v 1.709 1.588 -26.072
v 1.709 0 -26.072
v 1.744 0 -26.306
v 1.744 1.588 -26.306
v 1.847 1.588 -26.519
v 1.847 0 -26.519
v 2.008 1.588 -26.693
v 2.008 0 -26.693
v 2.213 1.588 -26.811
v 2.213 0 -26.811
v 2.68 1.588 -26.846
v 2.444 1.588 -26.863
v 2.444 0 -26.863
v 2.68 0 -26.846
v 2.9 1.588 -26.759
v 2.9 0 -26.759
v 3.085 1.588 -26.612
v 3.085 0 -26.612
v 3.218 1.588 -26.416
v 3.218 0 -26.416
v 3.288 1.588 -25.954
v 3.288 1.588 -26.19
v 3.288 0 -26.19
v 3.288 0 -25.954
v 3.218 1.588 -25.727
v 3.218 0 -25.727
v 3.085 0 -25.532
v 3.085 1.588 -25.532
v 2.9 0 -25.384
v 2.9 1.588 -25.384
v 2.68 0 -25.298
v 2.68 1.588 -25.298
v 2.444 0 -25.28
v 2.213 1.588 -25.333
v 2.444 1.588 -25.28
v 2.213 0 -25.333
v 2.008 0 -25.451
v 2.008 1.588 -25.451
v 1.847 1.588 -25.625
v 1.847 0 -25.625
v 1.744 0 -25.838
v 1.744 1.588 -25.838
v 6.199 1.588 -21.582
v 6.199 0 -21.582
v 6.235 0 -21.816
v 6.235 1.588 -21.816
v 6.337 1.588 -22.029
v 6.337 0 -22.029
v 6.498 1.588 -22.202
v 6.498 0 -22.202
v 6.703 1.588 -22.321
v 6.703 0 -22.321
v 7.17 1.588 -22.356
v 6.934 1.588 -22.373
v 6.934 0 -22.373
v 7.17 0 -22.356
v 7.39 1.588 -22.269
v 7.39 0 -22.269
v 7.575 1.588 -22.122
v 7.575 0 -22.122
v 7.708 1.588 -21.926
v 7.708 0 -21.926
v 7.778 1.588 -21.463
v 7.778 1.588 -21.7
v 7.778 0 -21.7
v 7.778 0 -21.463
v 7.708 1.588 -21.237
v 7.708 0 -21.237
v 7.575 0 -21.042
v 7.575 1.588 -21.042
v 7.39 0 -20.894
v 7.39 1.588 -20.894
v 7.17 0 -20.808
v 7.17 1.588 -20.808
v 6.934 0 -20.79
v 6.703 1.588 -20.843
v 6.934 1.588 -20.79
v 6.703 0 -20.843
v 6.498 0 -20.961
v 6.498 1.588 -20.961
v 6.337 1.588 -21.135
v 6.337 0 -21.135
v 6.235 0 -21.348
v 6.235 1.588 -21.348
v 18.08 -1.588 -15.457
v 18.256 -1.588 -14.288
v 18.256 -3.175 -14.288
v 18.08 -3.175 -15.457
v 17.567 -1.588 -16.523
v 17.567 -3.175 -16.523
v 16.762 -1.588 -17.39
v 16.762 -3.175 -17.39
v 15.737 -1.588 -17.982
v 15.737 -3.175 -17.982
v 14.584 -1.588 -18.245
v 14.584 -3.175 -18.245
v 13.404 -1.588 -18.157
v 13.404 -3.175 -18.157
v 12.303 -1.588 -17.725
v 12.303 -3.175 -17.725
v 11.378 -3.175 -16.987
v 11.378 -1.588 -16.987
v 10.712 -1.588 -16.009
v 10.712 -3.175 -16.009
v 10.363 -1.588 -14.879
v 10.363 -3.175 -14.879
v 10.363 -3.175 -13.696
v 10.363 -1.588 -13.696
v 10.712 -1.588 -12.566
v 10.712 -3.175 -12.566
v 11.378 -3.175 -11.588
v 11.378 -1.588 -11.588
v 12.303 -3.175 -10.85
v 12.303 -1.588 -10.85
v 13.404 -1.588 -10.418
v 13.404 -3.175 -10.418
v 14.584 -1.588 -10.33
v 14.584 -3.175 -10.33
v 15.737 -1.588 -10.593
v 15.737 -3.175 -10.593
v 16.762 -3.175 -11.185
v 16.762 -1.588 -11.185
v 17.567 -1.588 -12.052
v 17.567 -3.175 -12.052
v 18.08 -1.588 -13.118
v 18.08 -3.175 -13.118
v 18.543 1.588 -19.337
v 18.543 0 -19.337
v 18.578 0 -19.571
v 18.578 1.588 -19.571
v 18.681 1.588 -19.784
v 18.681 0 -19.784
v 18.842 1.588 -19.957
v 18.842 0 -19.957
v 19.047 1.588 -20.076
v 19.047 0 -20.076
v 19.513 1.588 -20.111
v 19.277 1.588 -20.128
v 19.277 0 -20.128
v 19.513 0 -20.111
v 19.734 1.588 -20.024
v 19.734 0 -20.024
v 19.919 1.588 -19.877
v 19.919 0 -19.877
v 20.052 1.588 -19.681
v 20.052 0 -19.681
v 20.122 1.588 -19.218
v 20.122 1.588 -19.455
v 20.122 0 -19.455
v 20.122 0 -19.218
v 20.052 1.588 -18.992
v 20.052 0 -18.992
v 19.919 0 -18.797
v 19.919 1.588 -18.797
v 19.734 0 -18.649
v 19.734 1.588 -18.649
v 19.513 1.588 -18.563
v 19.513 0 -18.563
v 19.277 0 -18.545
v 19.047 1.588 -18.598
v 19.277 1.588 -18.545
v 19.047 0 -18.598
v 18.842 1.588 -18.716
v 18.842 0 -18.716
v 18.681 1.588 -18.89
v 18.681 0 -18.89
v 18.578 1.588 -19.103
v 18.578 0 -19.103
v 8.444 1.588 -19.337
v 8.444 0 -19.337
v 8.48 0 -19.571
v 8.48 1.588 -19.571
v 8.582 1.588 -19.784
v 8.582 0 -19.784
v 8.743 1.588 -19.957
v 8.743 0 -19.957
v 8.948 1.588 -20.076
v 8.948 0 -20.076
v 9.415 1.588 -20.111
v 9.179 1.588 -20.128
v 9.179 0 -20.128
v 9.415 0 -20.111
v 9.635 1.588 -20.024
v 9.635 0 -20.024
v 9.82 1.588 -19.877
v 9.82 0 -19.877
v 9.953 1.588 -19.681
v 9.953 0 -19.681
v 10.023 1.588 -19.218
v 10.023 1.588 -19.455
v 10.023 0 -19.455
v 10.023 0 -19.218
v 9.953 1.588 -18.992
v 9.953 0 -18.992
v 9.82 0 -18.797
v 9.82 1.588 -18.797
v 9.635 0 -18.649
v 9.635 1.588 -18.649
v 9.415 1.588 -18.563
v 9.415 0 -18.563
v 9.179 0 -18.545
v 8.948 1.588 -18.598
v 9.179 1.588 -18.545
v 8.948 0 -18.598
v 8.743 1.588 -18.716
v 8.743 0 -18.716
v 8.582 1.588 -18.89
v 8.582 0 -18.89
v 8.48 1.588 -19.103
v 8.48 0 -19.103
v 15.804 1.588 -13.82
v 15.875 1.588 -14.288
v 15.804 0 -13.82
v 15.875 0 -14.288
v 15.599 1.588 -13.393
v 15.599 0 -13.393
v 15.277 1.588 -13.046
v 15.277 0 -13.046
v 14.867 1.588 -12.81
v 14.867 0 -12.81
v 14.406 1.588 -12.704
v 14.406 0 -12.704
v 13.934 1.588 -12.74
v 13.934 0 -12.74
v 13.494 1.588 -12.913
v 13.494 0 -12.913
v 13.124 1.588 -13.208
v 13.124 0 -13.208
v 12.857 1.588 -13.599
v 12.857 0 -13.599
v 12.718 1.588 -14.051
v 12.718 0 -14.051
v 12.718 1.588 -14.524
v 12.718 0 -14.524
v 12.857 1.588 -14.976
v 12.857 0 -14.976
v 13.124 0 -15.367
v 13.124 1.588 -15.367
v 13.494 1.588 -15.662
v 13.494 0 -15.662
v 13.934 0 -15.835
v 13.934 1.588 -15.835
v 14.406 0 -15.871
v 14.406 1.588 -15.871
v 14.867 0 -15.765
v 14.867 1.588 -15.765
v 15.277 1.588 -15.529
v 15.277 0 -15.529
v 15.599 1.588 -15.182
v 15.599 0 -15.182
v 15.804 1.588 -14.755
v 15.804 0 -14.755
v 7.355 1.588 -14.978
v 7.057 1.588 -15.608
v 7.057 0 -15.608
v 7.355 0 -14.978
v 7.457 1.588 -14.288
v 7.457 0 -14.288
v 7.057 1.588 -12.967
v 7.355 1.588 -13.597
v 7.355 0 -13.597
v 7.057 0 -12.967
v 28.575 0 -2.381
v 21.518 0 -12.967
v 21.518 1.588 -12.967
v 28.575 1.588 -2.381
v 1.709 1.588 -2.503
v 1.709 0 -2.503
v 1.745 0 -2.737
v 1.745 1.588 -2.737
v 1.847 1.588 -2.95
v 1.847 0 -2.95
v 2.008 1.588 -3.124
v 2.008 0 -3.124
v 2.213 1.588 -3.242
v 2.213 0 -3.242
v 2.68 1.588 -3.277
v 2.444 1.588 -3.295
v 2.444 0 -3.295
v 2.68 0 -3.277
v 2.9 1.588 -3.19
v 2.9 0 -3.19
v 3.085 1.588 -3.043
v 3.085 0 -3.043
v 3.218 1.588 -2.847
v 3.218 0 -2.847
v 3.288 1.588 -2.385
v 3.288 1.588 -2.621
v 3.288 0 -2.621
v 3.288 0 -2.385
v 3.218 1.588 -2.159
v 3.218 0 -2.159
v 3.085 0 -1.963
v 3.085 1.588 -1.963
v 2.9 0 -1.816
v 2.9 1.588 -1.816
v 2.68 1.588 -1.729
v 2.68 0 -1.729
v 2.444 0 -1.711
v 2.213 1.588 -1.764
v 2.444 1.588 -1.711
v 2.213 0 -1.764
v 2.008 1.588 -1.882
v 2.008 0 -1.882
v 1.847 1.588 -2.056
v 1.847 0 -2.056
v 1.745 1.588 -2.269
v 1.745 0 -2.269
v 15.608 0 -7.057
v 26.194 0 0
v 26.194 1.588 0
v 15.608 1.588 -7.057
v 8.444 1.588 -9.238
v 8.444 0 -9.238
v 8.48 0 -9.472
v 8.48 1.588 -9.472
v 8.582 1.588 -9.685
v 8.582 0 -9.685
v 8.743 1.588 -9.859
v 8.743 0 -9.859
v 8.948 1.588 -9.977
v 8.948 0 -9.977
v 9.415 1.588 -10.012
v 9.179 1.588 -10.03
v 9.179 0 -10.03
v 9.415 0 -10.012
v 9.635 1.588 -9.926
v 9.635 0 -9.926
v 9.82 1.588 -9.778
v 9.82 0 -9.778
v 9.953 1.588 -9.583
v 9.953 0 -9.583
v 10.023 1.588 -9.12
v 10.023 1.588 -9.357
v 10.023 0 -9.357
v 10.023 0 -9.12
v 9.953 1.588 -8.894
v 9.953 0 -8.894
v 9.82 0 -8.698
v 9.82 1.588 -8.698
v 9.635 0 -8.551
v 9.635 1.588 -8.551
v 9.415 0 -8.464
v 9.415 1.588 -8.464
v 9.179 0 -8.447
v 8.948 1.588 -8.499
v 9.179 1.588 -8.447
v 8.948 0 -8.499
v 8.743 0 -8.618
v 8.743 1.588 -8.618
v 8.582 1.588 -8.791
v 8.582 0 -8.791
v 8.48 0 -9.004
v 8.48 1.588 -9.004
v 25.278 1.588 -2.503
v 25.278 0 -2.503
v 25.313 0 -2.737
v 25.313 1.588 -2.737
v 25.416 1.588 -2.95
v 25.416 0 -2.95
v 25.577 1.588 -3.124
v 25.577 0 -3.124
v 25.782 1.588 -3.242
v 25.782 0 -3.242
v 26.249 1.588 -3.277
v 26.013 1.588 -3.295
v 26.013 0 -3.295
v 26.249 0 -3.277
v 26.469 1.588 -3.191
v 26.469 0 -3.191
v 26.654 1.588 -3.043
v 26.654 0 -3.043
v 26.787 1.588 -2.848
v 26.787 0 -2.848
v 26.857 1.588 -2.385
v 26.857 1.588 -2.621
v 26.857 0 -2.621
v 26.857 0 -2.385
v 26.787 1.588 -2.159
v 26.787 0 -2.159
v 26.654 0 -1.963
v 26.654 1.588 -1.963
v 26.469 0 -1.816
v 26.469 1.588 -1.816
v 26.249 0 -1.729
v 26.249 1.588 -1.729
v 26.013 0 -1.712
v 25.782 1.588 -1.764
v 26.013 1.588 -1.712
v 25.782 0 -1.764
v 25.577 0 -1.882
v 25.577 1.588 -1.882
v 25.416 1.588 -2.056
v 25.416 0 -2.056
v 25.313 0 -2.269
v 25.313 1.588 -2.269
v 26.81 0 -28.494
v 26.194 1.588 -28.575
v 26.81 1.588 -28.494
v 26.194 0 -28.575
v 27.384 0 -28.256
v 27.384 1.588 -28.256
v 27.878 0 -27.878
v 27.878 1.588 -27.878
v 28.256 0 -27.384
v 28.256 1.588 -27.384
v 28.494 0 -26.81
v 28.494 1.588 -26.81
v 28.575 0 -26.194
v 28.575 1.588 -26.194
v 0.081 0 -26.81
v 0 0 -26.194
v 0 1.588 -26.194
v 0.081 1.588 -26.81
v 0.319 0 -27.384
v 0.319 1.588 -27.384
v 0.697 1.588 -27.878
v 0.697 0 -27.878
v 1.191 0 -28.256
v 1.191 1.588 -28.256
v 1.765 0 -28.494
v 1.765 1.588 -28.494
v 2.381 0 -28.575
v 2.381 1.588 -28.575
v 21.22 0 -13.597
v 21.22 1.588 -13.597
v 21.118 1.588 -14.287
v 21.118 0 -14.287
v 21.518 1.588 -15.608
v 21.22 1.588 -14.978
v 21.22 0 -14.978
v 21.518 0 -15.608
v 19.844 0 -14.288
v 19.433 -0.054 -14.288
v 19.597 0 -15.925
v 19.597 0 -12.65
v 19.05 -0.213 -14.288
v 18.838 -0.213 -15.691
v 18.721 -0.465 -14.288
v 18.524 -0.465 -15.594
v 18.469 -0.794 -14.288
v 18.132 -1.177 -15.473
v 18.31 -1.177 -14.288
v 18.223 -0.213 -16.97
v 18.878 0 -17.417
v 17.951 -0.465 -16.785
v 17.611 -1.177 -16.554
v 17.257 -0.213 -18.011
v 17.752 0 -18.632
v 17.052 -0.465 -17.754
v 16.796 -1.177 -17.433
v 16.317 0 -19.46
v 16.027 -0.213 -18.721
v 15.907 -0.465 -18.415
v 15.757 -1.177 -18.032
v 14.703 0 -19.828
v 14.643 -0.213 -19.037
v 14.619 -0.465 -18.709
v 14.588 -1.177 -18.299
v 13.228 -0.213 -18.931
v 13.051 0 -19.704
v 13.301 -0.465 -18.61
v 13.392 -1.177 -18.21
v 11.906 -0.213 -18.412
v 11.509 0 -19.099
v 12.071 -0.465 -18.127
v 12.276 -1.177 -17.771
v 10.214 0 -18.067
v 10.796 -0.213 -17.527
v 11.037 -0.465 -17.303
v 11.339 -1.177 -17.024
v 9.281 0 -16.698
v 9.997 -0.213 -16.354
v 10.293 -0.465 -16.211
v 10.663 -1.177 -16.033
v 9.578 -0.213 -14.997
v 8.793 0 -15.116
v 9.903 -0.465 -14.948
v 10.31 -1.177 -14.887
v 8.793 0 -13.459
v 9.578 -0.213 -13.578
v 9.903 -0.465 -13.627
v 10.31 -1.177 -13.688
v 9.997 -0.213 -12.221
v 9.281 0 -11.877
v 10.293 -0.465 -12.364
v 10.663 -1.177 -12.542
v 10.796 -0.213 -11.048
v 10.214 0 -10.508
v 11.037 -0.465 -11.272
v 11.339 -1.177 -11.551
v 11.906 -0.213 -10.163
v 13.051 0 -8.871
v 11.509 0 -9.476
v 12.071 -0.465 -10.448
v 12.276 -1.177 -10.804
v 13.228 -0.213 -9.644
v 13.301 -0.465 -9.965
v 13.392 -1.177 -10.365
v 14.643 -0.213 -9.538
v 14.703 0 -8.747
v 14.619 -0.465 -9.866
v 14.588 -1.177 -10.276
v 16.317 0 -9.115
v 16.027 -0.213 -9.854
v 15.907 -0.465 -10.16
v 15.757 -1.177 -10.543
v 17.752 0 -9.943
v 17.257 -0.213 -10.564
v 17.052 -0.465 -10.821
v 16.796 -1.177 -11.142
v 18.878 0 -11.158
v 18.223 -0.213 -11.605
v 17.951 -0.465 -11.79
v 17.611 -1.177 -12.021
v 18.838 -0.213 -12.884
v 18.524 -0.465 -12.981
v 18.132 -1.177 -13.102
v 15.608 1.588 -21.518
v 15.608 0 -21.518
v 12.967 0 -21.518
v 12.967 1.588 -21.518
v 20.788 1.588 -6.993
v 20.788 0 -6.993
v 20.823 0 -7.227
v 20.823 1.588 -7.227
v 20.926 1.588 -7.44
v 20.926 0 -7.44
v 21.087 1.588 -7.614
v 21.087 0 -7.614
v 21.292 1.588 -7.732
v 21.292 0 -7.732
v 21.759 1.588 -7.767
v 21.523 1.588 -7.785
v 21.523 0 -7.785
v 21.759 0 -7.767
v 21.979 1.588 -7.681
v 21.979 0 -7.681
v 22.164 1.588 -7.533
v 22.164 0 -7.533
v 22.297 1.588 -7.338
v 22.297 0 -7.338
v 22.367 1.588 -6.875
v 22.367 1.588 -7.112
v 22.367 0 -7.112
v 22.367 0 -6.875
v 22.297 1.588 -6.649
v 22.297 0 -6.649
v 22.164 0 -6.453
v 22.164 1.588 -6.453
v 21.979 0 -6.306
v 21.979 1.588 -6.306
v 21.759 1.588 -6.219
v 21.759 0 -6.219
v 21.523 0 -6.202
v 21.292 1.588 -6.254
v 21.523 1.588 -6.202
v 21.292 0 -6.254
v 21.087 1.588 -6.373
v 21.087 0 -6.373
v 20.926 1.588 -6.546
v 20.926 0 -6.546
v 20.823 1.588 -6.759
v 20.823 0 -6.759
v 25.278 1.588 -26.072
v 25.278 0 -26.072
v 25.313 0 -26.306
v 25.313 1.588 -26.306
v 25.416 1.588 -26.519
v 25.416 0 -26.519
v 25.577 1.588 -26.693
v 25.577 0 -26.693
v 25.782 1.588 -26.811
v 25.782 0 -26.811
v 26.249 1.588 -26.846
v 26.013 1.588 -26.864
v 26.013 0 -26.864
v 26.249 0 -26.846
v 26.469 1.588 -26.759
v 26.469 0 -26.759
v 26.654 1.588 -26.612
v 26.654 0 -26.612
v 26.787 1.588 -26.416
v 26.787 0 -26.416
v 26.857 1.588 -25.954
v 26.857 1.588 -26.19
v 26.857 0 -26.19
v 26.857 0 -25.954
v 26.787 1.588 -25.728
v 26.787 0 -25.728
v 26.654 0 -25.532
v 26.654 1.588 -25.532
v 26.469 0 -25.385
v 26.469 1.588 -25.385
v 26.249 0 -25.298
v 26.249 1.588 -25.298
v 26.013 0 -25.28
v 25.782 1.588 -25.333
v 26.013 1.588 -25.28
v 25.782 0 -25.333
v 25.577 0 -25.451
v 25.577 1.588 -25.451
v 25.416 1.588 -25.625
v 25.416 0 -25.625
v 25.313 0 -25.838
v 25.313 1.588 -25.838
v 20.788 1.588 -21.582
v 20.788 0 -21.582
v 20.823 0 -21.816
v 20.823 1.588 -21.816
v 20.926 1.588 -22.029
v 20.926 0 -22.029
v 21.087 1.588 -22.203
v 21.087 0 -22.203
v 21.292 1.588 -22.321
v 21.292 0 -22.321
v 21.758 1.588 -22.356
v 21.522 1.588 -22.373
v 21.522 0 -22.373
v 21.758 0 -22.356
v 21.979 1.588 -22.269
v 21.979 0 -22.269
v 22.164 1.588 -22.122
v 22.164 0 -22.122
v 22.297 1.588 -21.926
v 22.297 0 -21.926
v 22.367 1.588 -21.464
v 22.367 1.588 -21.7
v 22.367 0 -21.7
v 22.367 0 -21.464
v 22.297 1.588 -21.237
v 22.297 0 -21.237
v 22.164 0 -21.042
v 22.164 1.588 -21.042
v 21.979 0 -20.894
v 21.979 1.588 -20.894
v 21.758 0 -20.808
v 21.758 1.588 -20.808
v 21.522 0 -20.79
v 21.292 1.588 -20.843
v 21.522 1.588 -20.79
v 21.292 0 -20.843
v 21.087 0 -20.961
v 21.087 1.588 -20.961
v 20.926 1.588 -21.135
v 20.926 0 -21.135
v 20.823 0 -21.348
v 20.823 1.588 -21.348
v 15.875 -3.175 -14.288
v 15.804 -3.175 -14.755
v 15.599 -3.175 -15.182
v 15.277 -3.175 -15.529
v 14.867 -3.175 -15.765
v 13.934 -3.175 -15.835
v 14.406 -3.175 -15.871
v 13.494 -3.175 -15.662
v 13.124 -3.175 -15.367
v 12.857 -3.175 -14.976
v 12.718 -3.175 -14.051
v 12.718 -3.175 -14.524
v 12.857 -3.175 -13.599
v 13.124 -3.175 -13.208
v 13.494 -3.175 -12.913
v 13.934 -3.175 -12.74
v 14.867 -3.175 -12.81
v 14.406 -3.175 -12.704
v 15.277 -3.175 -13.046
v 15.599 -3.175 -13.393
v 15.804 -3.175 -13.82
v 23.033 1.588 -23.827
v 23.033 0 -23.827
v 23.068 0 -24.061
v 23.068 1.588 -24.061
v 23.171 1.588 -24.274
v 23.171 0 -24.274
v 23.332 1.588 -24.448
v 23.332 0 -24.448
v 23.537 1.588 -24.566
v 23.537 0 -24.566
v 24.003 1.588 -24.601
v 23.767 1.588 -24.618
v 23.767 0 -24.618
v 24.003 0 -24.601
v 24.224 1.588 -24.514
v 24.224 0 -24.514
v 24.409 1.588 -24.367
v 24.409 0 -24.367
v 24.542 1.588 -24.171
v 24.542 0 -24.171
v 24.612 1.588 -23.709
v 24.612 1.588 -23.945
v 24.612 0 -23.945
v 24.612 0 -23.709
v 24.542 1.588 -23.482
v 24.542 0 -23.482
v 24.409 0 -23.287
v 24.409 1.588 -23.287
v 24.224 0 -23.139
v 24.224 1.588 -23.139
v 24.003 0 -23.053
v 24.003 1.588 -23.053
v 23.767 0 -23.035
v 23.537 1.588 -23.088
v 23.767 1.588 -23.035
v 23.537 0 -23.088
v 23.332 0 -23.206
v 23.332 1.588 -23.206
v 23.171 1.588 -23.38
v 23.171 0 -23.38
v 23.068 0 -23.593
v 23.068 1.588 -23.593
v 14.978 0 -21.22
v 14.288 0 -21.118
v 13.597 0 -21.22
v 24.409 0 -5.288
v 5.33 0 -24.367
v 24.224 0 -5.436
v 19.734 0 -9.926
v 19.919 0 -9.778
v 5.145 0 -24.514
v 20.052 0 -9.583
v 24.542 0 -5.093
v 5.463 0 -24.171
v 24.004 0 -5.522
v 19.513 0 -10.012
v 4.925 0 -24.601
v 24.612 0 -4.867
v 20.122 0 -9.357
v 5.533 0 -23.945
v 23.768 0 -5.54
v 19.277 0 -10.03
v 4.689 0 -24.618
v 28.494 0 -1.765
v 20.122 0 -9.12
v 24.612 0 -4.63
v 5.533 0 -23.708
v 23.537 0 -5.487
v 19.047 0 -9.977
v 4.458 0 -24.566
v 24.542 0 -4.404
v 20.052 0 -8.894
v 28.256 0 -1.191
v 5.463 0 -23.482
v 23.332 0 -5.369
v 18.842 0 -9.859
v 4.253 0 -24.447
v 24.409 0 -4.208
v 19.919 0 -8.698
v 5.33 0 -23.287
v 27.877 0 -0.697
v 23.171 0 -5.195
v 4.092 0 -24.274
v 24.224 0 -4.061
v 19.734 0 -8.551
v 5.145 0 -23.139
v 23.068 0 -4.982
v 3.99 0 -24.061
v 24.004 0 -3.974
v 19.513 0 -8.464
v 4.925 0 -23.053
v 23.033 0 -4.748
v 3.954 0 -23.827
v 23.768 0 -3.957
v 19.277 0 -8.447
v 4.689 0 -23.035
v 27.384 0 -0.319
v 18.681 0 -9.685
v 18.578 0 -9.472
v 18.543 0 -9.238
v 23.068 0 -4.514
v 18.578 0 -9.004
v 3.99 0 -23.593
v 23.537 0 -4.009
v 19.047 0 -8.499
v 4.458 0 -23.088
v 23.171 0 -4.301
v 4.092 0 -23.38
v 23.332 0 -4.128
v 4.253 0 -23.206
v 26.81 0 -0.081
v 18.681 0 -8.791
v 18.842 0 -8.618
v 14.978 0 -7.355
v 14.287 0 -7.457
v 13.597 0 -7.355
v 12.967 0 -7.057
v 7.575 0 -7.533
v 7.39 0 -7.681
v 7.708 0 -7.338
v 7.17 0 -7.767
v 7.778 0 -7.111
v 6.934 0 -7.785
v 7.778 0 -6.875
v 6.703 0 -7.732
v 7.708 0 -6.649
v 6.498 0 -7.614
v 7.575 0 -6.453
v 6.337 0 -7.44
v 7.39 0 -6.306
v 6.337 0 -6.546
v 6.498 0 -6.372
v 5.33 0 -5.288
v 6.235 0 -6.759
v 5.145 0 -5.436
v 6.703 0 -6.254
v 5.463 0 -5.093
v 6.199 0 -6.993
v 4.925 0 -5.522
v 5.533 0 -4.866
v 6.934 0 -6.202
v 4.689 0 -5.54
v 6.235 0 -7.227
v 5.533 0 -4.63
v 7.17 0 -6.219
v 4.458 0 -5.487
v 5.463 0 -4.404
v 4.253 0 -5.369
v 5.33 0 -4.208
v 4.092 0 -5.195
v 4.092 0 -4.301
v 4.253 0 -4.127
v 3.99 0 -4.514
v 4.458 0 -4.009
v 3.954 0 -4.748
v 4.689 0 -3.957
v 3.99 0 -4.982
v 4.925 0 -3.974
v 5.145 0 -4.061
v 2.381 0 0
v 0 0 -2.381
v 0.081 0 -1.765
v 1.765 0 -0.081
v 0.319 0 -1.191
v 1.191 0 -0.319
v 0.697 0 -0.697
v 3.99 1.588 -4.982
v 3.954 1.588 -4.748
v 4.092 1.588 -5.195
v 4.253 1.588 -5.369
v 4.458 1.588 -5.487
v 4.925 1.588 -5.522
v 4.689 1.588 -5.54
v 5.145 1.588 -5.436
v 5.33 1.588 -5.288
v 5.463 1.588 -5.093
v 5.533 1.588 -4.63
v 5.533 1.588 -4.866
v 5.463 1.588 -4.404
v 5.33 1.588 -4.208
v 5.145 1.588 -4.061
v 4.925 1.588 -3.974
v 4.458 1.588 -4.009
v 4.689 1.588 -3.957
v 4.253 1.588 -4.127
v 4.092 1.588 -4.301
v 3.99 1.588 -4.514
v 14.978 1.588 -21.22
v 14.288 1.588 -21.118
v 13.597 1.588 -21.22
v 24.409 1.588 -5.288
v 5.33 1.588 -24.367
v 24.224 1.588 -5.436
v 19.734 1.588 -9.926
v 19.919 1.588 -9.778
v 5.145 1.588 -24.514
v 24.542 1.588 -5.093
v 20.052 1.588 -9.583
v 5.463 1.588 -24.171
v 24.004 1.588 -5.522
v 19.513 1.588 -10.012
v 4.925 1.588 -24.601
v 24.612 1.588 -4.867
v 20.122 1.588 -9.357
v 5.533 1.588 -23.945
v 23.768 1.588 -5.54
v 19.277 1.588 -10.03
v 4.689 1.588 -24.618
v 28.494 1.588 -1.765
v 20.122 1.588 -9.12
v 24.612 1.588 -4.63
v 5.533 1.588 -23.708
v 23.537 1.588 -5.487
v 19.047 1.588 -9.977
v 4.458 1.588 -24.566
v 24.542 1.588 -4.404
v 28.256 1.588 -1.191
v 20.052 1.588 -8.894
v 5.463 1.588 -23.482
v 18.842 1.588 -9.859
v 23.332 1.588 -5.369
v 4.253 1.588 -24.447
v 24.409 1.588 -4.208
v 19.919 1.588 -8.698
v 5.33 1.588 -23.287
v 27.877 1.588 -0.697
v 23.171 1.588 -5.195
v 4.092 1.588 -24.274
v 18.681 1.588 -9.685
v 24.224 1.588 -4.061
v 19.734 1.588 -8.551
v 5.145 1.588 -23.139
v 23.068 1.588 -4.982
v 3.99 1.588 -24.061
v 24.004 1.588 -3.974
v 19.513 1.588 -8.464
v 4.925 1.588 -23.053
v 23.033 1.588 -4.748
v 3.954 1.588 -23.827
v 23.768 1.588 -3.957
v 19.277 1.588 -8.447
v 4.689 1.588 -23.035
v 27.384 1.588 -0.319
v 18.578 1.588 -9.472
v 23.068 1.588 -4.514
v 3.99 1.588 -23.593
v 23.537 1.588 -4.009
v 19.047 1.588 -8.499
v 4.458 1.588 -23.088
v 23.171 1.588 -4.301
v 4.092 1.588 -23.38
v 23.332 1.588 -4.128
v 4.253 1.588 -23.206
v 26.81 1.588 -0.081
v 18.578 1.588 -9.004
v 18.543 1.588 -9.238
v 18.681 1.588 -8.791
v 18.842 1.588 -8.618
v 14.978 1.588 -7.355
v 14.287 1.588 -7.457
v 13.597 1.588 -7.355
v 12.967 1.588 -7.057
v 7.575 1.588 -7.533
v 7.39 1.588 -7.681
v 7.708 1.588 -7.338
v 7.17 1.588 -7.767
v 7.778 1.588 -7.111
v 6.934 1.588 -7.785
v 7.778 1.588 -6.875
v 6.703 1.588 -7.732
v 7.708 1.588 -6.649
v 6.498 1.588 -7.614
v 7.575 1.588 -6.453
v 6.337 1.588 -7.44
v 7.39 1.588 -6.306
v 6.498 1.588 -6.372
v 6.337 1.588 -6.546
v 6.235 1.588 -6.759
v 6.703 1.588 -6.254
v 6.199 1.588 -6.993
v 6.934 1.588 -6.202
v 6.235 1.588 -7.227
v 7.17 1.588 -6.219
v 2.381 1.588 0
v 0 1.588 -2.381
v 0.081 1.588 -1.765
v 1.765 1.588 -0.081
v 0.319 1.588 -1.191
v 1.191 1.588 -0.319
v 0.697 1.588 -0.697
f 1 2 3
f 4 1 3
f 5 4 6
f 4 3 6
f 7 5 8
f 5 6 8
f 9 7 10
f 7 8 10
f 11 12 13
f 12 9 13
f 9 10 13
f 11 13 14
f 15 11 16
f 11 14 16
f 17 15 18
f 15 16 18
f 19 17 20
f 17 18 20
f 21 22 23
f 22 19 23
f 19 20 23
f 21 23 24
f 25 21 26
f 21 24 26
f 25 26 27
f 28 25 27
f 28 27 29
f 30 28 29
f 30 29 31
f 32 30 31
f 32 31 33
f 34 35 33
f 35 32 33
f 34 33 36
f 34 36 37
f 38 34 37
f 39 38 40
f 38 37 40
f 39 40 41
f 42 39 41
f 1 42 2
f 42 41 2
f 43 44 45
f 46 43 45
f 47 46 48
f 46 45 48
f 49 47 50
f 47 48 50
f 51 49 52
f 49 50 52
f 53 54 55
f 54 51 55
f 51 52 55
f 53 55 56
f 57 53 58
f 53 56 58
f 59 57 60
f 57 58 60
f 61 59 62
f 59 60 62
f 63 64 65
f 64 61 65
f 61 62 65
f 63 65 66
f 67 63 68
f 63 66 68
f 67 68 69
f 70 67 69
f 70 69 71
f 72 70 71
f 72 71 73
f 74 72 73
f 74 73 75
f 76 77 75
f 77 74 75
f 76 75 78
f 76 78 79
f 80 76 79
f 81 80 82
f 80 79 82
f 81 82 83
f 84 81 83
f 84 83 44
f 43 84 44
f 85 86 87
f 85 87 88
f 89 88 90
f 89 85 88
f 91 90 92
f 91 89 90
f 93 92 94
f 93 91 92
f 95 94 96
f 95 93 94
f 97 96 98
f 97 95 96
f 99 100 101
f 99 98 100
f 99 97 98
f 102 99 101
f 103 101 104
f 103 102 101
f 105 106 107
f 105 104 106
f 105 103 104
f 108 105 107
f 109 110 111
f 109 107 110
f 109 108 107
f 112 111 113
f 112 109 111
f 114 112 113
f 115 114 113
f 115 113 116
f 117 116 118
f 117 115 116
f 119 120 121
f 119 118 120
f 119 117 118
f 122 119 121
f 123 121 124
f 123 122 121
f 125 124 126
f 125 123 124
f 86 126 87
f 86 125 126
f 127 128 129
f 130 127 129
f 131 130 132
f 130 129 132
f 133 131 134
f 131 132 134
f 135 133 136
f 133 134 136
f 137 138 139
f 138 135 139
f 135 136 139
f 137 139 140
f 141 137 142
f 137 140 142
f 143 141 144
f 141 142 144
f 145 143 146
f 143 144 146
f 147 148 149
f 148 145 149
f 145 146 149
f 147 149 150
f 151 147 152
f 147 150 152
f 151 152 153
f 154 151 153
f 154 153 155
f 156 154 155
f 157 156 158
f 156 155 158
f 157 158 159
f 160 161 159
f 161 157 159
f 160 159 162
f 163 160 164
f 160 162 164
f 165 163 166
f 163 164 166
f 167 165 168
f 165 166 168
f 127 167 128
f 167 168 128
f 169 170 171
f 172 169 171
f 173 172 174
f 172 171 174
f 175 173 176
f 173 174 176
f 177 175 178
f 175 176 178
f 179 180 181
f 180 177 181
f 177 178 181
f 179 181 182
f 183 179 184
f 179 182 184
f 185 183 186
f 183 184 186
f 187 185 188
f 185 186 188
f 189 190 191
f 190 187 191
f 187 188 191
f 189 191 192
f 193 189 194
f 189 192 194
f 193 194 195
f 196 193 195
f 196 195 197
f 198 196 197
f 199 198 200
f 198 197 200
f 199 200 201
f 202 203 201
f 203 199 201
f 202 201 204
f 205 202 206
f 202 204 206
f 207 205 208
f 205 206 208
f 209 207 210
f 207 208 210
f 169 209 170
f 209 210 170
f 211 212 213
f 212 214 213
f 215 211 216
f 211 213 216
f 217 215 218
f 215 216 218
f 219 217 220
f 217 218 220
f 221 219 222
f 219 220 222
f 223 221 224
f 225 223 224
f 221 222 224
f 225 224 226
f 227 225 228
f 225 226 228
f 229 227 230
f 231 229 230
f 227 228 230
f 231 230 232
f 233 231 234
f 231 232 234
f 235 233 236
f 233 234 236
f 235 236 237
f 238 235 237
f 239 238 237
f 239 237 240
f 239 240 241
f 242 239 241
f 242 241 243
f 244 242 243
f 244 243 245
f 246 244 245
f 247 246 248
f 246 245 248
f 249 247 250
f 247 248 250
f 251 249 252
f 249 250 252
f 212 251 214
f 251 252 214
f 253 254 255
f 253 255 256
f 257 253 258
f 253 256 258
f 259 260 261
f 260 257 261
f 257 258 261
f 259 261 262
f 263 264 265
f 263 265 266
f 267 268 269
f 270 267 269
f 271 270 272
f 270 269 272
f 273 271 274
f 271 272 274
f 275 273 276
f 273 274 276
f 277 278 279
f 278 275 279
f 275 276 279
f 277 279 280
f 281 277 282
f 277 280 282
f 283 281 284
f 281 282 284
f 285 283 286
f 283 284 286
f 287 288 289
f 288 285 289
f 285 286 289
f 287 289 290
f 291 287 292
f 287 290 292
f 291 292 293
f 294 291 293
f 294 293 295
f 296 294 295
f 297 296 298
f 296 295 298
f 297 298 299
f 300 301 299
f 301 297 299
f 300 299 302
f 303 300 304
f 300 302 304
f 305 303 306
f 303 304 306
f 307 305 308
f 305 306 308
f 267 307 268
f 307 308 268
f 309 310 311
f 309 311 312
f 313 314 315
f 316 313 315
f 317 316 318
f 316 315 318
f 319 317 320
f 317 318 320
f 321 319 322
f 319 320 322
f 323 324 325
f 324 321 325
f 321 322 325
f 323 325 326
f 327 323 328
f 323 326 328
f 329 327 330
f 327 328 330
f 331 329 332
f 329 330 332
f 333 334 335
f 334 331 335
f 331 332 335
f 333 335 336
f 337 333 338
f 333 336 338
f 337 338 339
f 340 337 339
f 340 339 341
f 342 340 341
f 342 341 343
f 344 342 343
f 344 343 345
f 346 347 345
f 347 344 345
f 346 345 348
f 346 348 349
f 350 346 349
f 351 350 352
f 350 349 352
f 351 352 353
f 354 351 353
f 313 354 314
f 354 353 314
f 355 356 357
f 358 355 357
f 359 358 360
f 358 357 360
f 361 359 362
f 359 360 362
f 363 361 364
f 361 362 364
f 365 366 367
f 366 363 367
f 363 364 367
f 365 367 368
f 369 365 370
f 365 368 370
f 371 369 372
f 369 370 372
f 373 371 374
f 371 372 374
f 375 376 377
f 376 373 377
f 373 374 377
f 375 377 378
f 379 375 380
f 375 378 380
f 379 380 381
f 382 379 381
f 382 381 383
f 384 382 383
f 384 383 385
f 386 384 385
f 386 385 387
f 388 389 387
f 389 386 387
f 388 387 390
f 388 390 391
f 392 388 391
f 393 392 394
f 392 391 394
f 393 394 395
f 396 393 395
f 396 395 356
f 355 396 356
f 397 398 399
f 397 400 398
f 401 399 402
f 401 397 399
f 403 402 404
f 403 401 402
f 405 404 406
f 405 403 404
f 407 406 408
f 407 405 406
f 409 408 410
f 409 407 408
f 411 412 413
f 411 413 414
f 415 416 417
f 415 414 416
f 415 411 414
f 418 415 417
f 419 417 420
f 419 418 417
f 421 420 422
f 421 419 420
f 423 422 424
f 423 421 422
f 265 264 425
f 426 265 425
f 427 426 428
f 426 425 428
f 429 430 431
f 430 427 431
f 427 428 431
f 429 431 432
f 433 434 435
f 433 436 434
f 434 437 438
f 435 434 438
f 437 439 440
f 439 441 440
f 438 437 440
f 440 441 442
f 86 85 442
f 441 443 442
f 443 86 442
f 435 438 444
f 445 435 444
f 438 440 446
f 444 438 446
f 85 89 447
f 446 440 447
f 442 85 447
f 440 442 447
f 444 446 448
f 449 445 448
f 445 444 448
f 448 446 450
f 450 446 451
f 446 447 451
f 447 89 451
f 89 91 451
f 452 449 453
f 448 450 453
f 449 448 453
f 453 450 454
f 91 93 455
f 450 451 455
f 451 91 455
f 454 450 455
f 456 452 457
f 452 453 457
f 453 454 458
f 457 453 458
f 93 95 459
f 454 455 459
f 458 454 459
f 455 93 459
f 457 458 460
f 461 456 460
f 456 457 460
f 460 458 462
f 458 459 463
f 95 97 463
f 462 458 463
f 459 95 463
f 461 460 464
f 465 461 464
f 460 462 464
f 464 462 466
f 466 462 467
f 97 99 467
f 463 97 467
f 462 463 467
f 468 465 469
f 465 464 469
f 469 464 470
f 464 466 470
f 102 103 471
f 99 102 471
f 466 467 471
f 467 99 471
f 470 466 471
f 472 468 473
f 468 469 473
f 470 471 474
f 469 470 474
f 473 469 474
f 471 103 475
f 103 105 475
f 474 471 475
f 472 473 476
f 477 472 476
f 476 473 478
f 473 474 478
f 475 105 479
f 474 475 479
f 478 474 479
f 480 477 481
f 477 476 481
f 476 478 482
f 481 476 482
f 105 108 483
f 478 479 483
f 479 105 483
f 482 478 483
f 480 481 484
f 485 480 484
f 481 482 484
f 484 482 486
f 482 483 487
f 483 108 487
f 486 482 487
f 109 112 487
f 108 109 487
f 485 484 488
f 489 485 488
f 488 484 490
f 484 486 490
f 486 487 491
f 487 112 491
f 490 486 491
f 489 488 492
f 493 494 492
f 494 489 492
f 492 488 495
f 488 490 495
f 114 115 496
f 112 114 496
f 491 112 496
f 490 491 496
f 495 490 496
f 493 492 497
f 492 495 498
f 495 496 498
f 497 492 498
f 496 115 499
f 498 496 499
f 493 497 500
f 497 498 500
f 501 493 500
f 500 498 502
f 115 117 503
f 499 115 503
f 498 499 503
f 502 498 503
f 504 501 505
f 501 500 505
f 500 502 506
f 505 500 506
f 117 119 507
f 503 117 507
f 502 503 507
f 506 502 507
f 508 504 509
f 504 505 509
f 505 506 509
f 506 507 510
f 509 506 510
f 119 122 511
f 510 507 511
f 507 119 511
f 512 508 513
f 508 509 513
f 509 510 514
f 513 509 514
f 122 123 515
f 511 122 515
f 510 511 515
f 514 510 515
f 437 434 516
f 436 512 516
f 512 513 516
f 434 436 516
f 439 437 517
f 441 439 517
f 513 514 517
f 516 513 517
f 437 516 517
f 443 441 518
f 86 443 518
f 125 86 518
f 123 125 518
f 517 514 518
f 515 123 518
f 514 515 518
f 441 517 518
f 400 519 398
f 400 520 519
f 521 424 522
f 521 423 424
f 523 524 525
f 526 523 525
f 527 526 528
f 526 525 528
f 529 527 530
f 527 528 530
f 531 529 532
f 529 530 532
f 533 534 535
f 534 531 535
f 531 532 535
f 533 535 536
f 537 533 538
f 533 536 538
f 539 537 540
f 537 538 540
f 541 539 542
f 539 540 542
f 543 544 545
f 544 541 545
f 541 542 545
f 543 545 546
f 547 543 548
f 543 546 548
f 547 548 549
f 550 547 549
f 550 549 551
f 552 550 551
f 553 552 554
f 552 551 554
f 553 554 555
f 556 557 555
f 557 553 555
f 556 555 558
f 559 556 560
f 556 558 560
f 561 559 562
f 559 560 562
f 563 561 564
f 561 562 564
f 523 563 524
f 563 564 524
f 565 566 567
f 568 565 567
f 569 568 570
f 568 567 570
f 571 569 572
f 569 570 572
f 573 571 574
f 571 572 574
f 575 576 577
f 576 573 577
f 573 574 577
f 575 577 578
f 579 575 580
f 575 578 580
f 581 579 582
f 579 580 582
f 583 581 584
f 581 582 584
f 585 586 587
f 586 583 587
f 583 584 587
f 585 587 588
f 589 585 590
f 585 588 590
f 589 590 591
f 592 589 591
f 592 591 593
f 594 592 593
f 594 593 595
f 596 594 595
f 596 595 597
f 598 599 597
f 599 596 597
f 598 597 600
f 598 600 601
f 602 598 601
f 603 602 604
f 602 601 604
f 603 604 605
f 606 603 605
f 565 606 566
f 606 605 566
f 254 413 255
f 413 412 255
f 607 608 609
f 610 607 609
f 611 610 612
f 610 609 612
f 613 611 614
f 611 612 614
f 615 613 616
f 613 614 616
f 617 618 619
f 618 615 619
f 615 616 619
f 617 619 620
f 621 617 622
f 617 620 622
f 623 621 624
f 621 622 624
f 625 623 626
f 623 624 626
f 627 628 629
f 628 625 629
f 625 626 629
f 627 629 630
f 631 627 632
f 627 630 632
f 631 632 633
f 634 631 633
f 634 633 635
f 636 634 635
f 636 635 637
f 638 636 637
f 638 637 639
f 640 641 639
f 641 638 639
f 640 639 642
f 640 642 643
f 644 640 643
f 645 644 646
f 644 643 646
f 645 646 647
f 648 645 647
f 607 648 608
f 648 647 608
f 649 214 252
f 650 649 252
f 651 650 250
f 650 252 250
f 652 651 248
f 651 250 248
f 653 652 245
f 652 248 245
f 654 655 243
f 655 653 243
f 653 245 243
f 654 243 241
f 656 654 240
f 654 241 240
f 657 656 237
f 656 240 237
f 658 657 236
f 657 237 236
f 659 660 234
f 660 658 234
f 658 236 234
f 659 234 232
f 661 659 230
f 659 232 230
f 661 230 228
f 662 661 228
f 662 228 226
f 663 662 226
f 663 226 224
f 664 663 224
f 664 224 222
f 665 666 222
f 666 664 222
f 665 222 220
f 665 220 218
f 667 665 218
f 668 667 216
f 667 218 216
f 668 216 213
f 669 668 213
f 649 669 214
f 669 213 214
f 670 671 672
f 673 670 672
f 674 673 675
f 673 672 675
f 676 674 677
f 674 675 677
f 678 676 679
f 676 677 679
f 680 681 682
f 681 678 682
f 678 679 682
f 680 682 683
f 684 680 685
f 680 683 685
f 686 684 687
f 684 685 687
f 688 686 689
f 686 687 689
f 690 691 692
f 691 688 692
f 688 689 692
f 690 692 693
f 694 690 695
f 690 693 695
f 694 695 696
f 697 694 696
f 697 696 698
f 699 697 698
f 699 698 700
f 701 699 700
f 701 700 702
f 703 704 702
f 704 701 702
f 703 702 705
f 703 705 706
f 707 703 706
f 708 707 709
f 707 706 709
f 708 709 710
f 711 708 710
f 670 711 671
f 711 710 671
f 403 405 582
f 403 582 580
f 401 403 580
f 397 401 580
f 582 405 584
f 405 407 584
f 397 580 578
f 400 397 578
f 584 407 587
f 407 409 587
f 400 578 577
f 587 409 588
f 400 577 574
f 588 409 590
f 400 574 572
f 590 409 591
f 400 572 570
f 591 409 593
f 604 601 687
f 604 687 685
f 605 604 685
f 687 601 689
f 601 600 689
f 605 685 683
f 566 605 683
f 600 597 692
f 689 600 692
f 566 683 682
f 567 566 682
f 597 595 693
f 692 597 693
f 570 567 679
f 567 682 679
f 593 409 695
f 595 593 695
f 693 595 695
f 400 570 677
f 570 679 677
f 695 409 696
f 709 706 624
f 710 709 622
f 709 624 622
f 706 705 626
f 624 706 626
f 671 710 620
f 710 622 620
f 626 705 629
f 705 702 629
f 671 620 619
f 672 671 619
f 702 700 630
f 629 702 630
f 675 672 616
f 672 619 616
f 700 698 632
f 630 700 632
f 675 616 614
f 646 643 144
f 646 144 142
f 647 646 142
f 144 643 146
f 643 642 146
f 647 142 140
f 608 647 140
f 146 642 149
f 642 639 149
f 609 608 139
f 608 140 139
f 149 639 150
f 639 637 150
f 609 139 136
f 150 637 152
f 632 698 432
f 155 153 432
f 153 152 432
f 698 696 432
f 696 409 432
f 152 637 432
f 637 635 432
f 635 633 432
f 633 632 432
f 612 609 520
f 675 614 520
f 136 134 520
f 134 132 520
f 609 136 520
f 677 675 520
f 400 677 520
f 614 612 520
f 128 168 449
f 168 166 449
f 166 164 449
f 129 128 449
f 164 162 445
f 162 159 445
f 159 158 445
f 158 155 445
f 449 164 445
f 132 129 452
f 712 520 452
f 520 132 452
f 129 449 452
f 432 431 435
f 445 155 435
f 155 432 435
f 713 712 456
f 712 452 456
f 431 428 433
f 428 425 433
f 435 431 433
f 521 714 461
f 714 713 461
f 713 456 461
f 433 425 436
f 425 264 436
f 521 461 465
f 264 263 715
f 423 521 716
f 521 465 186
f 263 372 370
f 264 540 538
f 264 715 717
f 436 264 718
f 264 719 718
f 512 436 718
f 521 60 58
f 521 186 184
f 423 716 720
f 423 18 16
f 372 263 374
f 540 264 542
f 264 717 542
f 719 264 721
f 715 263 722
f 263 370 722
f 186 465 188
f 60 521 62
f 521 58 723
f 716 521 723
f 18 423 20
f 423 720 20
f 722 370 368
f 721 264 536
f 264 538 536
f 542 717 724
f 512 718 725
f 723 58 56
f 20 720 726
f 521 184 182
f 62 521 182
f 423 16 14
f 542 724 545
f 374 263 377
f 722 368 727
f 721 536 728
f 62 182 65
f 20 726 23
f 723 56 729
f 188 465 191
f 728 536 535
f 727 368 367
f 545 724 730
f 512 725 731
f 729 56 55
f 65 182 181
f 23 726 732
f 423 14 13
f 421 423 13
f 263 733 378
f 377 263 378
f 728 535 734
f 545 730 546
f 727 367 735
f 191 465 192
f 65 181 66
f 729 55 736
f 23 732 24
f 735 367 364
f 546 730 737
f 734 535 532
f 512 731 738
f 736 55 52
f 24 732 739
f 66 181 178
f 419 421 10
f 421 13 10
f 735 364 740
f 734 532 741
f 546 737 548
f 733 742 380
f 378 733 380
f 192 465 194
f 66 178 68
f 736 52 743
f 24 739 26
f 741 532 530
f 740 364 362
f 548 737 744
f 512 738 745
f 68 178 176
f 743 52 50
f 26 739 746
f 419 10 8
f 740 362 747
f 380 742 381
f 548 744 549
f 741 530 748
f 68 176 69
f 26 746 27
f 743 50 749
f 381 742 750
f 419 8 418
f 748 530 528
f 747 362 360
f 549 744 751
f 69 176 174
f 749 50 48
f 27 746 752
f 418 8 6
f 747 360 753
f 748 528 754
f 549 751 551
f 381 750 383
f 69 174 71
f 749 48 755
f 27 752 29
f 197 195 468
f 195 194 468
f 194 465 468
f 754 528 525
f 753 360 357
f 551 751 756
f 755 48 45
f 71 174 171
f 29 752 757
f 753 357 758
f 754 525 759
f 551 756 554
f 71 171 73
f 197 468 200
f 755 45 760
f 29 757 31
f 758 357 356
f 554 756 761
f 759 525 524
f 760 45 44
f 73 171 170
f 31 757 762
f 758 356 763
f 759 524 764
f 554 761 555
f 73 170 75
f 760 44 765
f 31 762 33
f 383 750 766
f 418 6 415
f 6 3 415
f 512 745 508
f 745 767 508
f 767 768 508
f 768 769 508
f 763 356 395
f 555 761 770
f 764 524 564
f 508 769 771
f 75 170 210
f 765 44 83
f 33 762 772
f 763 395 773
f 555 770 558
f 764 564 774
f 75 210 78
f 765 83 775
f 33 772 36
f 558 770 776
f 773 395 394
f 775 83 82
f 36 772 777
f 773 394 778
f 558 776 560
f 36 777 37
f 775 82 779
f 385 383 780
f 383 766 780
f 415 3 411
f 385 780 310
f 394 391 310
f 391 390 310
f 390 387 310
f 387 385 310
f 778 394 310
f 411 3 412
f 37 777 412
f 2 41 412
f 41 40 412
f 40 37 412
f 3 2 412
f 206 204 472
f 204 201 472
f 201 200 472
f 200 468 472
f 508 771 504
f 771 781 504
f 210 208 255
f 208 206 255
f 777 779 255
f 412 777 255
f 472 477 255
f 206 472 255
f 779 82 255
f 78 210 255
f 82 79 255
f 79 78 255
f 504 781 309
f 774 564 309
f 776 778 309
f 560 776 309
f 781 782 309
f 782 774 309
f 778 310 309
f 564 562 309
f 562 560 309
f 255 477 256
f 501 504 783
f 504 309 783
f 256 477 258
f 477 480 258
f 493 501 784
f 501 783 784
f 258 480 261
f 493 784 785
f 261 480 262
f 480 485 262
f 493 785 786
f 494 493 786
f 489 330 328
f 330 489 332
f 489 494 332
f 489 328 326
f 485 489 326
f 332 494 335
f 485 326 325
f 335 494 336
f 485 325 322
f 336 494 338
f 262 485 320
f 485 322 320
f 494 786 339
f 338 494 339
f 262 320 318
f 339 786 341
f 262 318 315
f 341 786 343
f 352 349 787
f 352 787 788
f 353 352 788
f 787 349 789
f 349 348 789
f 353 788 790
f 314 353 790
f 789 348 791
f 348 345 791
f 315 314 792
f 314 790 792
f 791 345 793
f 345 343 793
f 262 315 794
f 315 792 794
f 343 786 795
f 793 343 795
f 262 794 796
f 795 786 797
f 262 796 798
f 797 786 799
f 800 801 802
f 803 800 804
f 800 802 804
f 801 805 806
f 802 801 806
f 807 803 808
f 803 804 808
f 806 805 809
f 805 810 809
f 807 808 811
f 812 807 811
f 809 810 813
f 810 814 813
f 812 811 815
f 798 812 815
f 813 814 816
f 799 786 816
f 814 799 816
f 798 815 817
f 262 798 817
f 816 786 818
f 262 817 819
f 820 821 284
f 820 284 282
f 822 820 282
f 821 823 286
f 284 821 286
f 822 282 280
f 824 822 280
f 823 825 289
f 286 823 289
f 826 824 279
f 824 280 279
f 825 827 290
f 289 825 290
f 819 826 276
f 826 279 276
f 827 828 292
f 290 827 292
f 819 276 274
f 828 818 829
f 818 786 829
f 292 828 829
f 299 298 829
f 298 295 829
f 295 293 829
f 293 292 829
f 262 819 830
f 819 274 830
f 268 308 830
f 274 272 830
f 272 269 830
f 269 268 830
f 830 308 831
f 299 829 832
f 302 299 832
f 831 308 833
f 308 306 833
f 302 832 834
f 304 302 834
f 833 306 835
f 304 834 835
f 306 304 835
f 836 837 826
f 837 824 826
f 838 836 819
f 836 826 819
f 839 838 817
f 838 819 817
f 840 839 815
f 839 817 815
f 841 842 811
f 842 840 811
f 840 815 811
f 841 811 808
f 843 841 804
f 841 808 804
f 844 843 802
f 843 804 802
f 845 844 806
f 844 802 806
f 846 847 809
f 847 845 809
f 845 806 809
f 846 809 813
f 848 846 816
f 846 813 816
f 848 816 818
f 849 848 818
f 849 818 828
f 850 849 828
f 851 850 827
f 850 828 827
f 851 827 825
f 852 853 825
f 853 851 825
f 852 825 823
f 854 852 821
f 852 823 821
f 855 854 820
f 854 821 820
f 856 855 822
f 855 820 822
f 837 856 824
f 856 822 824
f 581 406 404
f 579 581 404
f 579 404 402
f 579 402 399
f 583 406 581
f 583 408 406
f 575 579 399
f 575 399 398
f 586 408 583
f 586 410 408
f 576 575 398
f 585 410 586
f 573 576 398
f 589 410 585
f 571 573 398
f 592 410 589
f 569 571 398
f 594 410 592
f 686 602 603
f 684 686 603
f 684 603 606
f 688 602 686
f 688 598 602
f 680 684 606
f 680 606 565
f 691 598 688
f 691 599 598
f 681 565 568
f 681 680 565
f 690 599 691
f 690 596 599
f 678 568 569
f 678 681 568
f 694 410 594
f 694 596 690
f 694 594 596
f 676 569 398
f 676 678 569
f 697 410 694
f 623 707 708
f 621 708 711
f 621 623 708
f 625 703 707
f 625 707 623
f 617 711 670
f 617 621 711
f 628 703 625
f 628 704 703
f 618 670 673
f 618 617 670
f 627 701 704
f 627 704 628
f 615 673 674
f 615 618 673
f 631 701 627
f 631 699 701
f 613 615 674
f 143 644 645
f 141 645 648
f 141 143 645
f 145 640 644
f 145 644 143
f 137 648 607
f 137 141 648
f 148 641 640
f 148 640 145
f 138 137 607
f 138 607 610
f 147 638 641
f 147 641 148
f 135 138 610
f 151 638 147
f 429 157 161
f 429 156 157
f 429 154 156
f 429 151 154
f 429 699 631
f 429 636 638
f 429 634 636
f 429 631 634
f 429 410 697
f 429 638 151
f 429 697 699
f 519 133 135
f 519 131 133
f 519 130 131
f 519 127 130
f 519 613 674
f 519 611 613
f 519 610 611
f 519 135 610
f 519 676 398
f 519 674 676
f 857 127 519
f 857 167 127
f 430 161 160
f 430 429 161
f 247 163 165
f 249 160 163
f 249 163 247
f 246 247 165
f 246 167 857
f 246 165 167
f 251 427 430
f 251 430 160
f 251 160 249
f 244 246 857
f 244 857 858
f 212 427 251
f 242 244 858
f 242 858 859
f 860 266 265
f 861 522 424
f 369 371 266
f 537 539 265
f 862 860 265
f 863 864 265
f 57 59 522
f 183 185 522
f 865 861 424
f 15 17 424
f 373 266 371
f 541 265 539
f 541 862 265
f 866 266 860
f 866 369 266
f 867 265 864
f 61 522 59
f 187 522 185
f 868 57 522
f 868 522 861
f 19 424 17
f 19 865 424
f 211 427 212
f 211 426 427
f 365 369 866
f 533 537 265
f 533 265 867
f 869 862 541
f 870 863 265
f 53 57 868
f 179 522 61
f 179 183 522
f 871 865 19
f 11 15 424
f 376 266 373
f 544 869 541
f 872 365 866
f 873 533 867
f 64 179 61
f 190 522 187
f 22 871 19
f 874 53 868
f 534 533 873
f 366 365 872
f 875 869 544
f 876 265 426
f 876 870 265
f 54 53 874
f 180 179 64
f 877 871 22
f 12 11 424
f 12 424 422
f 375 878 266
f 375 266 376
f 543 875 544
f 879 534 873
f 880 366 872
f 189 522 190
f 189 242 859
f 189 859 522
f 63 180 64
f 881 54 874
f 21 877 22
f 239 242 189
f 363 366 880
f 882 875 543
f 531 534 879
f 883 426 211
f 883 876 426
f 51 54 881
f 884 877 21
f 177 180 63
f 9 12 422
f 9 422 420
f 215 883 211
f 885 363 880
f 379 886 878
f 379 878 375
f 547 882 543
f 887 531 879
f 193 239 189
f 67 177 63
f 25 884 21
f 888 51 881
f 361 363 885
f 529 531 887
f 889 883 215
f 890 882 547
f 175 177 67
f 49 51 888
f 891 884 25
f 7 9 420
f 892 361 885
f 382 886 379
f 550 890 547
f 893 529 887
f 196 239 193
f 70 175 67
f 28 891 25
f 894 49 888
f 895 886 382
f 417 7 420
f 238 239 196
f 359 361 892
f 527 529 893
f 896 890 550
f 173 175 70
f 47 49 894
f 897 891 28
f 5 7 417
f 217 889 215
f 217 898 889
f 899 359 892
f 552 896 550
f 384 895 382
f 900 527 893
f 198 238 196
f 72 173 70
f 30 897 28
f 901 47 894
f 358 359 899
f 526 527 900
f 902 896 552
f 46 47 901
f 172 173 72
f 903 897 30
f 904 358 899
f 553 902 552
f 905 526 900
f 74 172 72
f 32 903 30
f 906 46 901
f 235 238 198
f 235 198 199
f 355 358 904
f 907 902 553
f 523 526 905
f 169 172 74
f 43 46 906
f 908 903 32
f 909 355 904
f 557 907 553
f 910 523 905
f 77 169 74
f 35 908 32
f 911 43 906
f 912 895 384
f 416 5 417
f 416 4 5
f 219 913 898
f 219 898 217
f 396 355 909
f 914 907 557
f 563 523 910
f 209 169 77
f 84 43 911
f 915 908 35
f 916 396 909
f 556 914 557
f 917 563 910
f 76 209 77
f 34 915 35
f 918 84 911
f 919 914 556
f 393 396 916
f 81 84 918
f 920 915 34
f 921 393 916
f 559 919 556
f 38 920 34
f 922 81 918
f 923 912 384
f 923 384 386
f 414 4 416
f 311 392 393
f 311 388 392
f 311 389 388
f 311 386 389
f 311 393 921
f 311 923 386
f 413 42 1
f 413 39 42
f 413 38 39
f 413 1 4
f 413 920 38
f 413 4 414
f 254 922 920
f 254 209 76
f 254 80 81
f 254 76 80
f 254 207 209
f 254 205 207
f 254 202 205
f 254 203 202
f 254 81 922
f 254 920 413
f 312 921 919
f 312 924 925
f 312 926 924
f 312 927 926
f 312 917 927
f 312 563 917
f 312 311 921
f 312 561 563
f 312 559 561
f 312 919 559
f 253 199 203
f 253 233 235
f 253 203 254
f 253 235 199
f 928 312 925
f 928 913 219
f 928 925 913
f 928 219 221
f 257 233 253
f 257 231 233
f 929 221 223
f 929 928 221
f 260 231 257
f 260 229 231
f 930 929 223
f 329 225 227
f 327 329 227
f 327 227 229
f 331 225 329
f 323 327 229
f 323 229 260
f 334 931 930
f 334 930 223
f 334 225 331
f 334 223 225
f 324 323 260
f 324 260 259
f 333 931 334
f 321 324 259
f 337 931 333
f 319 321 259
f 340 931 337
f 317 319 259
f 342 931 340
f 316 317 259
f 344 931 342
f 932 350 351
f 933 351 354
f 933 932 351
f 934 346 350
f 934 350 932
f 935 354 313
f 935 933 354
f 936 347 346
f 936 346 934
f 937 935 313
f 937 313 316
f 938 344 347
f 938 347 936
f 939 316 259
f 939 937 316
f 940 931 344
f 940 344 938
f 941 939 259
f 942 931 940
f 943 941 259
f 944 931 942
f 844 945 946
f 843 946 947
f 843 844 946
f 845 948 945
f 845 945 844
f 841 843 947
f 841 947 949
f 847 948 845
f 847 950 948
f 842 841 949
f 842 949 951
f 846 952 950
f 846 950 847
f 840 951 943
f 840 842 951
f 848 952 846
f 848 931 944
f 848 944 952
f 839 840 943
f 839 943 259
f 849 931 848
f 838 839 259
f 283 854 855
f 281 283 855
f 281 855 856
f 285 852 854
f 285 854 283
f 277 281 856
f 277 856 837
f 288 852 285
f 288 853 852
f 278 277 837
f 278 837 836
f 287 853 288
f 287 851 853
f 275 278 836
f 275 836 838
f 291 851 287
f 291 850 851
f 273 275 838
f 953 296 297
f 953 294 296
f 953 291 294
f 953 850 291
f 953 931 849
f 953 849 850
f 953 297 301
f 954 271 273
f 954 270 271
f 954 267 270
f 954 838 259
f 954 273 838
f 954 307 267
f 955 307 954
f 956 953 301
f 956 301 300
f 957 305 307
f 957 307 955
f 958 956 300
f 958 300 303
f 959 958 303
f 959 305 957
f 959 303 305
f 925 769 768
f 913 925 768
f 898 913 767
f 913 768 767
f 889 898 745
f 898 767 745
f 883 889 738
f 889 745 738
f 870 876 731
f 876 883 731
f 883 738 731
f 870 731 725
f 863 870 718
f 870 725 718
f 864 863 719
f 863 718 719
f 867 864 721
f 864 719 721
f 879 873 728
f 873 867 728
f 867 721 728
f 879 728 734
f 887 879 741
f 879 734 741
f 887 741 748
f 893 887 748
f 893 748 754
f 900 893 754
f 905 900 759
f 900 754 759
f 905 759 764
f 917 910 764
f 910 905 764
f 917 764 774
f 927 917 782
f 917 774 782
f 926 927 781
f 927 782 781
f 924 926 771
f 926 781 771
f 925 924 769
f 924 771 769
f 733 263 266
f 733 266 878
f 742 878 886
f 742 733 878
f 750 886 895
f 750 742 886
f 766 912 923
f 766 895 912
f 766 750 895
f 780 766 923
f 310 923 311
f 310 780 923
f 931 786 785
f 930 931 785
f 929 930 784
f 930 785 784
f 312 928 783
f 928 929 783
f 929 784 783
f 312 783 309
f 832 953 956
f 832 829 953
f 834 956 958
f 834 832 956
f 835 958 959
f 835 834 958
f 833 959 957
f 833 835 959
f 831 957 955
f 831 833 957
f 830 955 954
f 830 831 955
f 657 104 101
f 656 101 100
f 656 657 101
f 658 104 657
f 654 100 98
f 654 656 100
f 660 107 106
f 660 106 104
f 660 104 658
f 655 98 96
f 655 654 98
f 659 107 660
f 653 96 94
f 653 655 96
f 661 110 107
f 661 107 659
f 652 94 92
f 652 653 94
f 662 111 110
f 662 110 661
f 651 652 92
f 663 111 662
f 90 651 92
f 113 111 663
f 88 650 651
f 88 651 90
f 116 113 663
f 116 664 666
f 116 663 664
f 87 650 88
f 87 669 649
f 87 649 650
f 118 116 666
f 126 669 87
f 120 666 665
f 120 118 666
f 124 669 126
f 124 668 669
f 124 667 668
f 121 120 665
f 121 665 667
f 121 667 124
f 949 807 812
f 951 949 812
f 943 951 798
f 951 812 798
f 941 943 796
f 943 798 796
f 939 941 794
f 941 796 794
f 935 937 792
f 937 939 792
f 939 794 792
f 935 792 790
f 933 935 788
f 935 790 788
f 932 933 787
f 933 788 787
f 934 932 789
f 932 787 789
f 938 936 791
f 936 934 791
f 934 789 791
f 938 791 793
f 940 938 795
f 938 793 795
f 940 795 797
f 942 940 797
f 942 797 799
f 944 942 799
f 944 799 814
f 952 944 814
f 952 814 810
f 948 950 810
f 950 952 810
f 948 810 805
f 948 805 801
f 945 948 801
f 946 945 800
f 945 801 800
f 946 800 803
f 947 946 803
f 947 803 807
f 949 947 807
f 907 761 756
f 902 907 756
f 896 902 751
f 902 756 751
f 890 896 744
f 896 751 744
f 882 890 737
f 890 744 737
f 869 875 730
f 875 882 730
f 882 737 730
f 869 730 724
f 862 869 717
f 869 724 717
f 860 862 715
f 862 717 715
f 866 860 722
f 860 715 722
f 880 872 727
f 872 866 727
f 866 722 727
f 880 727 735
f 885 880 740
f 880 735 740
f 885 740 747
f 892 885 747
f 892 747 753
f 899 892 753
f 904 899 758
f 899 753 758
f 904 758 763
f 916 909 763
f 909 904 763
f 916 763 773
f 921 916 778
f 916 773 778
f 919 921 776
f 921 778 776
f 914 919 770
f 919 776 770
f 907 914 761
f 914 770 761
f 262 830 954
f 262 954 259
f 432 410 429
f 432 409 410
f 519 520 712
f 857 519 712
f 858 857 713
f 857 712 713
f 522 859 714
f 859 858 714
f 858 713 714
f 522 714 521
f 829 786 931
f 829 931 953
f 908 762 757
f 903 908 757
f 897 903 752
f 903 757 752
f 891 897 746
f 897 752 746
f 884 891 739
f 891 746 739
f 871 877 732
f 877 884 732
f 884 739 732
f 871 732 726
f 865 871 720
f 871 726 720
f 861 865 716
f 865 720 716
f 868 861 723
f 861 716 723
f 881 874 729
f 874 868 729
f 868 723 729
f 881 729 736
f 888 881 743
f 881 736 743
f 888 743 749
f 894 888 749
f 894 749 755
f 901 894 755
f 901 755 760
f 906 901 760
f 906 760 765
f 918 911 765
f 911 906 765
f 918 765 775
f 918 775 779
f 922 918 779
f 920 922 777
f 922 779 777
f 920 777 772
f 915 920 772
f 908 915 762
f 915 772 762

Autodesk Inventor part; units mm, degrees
ref_plane "YZ Plane" through (0, 0, 0) normal (1, 0, 0) x (0, 1, 0)
ref_plane "XZ Plane" through (0, 0, 0) normal (0, 1, 0) x (-1, 0, 0)
ref_plane "XY Plane" through (0, 0, 0) normal (0, 0, 1) x (1, 0, 0)
sketch "Sketch2" plane through (0, 0, 0) normal (0, 1, 0) x (-1, 0, 0)
  line L0 (-2.3812, 0) -> (-26.1937, 0) construction
  line L1 (-28.575, -2.3812) -> (-28.575, -26.1937) construction
  line L2 (-26.1937, -28.575) -> (-2.3812, -28.575) construction
  line L3 (0, -26.1937) -> (0, -2.3812) construction
  line L4 (-27.8023, -27.8024) -> (0.7727, 0.7726) construction
  line L5 (0, -28.575) -> (-28.575, 0) construction
  circle A0 centre (-14.2875, -14.2875) radius 6.35 construction
  line L6 (-14.2875, -28.575) -> (-14.2875, 0) construction
  line L7 (0, -14.2875) -> (-28.575, -14.2875) construction
  arc A1 (-2.3812, -28.575) -> (0, -26.1937) centre (-2.3812, -26.1937) ccw
  line L8 (0, -26.1937) -> (-7.0569, -15.6084)
  line L9 (-2.3812, -28.575) -> (-12.9666, -21.5181)
  arc A2 (-28.575, -26.1937) -> (-26.1937, -28.575) centre (-26.1937, -26.1937) ccw
  arc A3 (-26.1937, 0) -> (-28.575, -2.3812) centre (-26.1937, -2.3813) ccw
  arc A4 (0, -2.3812) -> (-2.3812, 0) centre (-2.3812, -2.3812) ccw
  line L10 (-15.6084, -21.5181) -> (-26.1937, -28.575)
  line L11 (-28.575, -26.1937) -> (-21.5181, -15.6084)
  line L12 (-21.5181, -12.9666) -> (-28.575, -2.3812)
  line L13 (-26.1937, 0) -> (-15.6084, -7.0569)
  line L14 (-12.9666, -7.0569) -> (-2.3812, 0)
  line L15 (0, -2.3812) -> (-7.0569, -12.9666)
  arc A5 (-12.9666, -21.5181) -> (-15.6084, -21.5181) centre (-14.2875, -23.4994) ccw
  arc A6 (-7.0569, -12.9666) -> (-7.0569, -15.6084) centre (-5.0756, -14.2875) ccw
  arc A7 (-15.6084, -7.0569) -> (-12.9666, -7.0569) centre (-14.2875, -5.0756) ccw
  arc A8 (-21.5181, -15.6084) -> (-21.5181, -12.9666) centre (-23.4994, -14.2875) ccw
  circle A9 centre (-26.0719, -26.072) radius 0.7938
  circle A10 centre (-14.2875, -14.2875) radius 16.6688 construction
  circle A11 centre (-23.8268, -23.8269) radius 0.7938
  circle A12 centre (-21.5818, -21.5819) radius 0.7938
  circle A13 centre (-19.3367, -19.3368) radius 0.7938
  circle A14 centre (-2.503, -26.0719) radius 0.7938
  circle A15 centre (-4.7481, -23.8268) radius 0.7938
  circle A16 centre (-6.9931, -21.5818) radius 0.7938
  circle A17 centre (-9.2382, -19.3367) radius 0.7938
  circle A18 centre (-2.5031, -2.503) radius 0.7938
  circle A19 centre (-4.7482, -4.7481) radius 0.7938
  circle A20 centre (-6.9932, -6.9931) radius 0.7938
  circle A21 centre (-9.2383, -9.2382) radius 0.7938
  circle A22 centre (-26.072, -2.5031) radius 0.7938
  circle A23 centre (-23.8269, -4.7482) radius 0.7938
  circle A24 centre (-21.5819, -6.9932) radius 0.7938
  circle A25 centre (-19.3368, -9.2383) radius 0.7938
  point P0 (0, 0)
  point P1 (-7.9375, -14.2875)
  point P2 (-14.2875, -20.6375)
  point P3 (-20.6375, -14.2875)
  point P4 (-14.2875, -7.9375)
  dimension "d0" = 27.813
  dimension "d1" = 27.8131
  dimension "d2" = 12.7
  dimension "d3" = 2.3813
  dimension "d4" = 2.3813
  dimension "d5" = 2.3813
  dimension "d6" = 1.5875
  dimension "d7" = 33.3375
  dimension "d10" = 3.175
  dimension "d17" = 360
extrude "Extrusion1" add sketch "Sketch2" along normal blind 1.5875
sketch "Sketch3" plane through (0, 0, 0) normal (0, -1, 0) x (1, 0, 0)
  circle A0 centre (14.2875, -14.2875) radius 3.9688
  circle A1 centre (14.2875, -14.2875) radius 1.5875
  point P0 (0, 0)
  dimension "d21" = 7.9375
  dimension "d22" = 3.175
extrude "Extrusion2" add sketch "Sketch3" along normal blind 3.175
extrude "Extrusion3" cut sketch "Sketch3" against normal through all contours A1
fillet "Fillet1" radius 1.5875 1 edges at (10.3187, 0, -14.2875)
properties part number "servoHornX"
